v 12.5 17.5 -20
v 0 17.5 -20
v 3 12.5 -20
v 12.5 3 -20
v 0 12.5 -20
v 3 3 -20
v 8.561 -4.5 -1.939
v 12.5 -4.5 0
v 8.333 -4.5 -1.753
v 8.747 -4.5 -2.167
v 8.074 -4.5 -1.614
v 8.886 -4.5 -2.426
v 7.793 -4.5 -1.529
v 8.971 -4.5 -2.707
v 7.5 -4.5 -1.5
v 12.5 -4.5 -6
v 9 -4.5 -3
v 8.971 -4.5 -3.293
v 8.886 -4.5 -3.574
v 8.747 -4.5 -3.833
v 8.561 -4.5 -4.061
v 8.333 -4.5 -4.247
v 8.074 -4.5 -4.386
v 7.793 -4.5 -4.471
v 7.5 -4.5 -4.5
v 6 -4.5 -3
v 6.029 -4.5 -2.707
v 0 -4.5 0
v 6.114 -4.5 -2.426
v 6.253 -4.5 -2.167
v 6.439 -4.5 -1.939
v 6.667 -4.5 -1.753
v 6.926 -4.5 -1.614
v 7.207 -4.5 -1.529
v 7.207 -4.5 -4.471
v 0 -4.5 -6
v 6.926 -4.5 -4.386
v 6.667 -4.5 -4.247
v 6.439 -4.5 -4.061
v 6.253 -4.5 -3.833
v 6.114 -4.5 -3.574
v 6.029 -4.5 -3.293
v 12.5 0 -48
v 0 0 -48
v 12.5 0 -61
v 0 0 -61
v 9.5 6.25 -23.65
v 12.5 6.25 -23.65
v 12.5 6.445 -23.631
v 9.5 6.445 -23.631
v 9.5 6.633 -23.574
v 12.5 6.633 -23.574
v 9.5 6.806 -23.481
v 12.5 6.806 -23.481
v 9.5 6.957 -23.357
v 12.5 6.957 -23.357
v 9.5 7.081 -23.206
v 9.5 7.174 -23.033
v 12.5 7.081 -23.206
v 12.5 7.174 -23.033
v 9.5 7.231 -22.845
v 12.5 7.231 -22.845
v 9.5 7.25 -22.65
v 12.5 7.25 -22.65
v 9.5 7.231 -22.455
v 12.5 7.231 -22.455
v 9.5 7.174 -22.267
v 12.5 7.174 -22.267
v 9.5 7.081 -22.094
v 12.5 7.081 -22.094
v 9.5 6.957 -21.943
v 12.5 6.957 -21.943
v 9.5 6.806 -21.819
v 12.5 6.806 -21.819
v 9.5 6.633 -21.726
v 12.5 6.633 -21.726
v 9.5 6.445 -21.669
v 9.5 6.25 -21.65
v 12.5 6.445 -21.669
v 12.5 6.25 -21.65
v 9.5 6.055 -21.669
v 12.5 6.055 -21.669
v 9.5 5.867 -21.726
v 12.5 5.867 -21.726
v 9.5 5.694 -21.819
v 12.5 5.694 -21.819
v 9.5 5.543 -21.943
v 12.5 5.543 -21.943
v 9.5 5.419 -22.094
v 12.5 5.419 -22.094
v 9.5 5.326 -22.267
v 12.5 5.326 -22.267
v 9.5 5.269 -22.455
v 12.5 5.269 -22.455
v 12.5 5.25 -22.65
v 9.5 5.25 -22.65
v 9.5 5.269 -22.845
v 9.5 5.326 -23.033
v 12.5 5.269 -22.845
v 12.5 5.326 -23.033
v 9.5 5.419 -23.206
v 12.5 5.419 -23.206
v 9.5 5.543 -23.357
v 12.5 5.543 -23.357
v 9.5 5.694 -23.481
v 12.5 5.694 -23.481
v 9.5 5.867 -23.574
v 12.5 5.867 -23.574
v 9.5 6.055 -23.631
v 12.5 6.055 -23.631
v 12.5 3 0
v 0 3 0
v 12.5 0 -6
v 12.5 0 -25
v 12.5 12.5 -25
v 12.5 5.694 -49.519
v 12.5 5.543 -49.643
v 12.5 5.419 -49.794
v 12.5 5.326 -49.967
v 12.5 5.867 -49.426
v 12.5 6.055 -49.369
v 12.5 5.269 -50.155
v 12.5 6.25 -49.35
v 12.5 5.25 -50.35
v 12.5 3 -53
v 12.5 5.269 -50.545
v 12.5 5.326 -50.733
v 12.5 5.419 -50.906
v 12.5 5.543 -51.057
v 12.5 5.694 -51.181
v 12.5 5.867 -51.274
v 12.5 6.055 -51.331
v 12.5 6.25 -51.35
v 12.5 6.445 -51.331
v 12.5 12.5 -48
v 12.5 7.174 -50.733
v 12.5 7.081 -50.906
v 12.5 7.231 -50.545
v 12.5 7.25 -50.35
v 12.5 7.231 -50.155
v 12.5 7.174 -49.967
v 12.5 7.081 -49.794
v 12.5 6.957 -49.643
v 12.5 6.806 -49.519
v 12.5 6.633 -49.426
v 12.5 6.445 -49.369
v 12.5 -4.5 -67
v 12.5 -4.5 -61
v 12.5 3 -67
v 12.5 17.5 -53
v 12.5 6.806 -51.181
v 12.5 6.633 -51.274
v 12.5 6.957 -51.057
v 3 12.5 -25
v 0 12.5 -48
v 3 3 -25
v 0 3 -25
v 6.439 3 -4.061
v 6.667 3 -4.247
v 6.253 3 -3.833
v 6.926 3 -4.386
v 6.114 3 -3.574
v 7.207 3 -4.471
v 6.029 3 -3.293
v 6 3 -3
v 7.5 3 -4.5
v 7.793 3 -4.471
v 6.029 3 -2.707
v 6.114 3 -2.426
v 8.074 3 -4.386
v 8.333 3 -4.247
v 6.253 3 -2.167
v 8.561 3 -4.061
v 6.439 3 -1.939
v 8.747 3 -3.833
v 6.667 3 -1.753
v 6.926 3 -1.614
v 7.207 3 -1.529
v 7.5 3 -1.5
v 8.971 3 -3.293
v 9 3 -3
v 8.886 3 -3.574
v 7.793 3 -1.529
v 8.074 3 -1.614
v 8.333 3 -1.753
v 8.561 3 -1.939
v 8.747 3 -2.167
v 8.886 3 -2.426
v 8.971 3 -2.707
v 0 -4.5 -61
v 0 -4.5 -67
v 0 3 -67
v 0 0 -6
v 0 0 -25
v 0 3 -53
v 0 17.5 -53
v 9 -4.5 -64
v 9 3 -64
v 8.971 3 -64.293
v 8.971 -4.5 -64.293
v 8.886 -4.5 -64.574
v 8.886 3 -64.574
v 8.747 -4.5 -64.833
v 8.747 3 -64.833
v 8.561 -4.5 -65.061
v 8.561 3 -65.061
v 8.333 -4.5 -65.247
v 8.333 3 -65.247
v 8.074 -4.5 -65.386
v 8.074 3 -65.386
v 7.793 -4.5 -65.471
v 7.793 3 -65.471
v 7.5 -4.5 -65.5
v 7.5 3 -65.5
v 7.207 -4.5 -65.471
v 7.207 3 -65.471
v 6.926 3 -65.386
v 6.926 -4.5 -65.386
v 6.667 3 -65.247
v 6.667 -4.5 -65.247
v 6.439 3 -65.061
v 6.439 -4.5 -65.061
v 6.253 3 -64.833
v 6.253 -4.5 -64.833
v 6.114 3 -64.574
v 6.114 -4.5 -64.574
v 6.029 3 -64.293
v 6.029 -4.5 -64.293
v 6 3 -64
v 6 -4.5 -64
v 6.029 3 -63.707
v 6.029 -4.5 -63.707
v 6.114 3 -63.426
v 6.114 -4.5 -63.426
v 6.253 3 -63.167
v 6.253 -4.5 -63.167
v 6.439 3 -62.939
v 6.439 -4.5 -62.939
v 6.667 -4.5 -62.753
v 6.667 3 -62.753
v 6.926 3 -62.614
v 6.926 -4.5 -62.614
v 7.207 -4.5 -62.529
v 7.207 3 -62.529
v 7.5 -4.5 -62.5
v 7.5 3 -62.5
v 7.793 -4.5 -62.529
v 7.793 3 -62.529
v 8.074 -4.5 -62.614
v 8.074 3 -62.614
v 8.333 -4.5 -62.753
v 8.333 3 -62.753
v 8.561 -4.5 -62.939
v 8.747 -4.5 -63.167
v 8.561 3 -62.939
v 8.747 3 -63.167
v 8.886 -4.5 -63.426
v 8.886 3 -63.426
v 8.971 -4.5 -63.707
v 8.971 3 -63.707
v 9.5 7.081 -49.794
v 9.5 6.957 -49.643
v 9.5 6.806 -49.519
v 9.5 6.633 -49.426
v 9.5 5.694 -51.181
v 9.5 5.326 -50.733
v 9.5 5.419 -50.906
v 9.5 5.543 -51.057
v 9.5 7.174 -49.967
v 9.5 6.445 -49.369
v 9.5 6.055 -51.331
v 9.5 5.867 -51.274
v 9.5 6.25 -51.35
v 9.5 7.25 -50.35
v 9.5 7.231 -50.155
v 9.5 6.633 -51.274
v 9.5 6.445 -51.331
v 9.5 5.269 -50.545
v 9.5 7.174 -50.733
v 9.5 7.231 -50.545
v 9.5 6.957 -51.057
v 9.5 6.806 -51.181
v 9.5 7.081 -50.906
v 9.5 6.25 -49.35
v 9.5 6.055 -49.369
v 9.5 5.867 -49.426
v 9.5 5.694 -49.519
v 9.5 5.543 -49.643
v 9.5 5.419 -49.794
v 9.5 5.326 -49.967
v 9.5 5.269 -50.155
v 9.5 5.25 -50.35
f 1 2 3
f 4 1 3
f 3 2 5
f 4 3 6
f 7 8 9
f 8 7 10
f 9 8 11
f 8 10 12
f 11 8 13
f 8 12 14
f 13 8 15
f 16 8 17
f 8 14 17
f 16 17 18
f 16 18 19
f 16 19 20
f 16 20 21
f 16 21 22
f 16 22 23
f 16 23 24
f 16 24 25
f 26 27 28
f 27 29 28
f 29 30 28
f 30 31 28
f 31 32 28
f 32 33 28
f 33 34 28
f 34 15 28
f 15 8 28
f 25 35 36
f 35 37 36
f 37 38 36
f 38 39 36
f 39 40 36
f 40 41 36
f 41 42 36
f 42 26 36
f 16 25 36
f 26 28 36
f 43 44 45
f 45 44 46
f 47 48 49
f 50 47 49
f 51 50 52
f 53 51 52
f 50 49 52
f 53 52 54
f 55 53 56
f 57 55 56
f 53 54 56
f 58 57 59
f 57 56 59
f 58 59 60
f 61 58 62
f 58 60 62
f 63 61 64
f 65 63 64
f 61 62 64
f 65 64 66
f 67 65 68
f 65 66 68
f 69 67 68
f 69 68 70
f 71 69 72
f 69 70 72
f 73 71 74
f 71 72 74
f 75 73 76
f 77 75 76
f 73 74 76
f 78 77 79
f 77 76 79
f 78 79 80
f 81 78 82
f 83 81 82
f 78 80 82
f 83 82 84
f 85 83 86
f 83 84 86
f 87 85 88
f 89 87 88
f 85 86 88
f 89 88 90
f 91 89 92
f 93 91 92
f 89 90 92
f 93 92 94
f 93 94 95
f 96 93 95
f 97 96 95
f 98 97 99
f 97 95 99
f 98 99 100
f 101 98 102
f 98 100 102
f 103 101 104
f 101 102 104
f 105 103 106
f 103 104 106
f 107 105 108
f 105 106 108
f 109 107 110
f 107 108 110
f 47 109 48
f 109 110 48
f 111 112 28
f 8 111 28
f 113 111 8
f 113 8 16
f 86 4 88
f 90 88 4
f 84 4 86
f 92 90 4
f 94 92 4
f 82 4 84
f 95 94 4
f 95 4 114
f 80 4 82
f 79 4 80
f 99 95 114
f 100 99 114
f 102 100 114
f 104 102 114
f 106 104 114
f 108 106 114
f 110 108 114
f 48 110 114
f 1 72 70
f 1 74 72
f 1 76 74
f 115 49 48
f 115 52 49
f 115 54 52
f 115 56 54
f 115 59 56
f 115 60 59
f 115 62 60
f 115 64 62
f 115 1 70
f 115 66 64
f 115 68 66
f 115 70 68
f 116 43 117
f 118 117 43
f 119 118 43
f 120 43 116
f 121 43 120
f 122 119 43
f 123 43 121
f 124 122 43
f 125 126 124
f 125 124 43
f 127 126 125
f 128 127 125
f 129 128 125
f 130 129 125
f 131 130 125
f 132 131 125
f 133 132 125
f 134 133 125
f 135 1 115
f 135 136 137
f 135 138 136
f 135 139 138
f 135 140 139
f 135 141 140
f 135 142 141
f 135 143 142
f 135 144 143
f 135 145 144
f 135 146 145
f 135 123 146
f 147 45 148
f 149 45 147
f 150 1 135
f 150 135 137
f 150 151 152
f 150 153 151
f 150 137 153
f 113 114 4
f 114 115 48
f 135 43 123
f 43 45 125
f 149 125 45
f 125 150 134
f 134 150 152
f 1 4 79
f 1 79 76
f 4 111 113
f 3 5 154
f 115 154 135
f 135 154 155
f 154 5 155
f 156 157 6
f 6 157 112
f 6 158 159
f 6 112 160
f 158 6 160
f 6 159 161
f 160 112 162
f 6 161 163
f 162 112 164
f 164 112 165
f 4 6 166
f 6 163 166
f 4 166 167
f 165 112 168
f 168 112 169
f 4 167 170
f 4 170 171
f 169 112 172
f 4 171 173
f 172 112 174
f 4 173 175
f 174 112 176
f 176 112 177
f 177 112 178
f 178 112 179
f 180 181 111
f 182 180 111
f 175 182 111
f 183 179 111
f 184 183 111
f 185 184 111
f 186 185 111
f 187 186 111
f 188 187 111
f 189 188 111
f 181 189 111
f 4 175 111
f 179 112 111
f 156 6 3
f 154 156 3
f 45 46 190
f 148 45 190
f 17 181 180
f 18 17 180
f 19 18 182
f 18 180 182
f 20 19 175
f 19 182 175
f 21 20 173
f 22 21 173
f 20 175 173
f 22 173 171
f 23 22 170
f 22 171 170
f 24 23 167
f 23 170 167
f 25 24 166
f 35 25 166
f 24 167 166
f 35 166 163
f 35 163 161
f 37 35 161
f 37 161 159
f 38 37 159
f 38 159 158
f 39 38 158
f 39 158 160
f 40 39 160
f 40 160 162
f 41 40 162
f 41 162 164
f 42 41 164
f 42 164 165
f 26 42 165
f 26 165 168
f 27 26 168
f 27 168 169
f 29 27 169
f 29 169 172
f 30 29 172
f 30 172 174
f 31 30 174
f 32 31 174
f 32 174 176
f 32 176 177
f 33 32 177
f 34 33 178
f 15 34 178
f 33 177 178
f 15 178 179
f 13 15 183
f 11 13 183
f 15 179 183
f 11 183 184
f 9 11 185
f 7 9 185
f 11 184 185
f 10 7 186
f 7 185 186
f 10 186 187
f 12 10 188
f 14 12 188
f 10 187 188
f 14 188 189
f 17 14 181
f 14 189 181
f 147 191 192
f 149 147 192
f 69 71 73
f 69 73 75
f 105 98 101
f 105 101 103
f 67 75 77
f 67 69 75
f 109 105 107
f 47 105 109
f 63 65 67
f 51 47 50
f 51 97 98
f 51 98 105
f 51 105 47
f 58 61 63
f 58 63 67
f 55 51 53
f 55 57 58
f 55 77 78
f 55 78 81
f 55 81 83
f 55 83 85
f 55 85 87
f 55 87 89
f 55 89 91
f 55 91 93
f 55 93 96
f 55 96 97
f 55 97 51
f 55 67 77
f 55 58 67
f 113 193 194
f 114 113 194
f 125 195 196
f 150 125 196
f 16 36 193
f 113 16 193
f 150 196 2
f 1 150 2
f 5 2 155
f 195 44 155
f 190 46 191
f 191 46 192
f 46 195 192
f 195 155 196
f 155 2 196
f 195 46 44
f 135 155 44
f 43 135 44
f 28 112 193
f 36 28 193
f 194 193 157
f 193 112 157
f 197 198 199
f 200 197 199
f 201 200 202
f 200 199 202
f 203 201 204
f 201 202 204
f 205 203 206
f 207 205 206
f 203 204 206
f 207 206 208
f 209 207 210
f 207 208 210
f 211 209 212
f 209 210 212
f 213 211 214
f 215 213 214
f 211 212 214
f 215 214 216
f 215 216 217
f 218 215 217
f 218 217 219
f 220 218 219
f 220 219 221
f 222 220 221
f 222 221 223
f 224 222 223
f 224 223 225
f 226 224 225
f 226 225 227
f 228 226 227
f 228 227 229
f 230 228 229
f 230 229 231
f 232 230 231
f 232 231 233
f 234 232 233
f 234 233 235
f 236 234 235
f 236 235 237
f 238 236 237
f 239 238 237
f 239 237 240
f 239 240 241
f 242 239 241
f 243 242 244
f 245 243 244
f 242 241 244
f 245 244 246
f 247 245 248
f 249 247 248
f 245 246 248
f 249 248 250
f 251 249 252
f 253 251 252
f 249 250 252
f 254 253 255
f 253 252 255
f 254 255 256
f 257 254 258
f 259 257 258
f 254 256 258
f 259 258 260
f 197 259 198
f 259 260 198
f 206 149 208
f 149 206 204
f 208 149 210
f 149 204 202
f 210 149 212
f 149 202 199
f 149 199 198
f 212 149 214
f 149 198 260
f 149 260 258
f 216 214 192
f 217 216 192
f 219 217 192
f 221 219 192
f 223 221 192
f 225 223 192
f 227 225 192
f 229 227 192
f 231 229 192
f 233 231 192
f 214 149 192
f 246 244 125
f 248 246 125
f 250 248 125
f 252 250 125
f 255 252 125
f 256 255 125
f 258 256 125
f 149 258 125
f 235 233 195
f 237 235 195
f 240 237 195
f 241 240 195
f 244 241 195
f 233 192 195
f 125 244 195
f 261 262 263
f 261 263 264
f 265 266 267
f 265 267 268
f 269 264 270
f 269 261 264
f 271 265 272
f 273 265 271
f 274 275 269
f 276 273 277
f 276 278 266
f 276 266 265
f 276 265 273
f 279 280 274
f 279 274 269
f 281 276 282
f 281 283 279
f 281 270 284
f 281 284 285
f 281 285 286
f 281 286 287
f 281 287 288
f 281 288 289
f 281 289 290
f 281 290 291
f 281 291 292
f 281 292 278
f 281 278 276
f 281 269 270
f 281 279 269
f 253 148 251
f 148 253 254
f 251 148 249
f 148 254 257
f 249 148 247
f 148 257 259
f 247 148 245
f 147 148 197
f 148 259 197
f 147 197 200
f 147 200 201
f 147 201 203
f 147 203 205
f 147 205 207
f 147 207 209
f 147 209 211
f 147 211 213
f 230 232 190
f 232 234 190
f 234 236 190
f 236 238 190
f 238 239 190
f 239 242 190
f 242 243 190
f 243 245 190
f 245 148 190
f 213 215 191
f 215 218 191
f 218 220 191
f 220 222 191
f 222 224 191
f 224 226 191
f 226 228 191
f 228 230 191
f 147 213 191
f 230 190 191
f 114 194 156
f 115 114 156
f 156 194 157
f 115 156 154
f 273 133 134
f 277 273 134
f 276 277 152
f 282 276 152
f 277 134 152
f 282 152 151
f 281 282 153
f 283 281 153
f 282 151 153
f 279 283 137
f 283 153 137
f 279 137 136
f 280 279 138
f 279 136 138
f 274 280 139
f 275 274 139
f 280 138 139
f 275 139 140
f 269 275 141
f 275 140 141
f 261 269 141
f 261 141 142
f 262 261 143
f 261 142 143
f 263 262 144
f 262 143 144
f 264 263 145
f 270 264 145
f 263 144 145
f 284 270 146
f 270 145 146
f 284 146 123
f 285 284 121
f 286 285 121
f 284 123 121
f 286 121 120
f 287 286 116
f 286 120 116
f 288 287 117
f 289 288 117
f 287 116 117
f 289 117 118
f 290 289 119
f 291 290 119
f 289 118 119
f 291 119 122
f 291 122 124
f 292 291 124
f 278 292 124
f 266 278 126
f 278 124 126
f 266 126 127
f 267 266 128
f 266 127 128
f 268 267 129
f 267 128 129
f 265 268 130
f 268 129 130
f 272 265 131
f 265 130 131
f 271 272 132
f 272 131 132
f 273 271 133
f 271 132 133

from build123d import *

# Parameters (mm, degrees)
BOSS_EXTRUDE1_DEPTH = 12.5
SKETCH3_R           = 1.5
CUT_EXTRUDE1_DEPTH  = 12.5
SKETCH4_W           = 3
SKETCH4_H           = 9.5
CUT_EXTRUDE2_DEPTH  = 5
SKETCH5_R           = 1
CUT_EXTRUDE3_DEPTH  = 3


with BuildPart() as part:
    # Sketch2 → Boss-Extrude1 (new body)
    with BuildSketch(Plane(origin=(0, 0, 0), x_dir=(0, 0, -1), z_dir=(1, 0, 0))):
        Polygon((6, 0), (25, 0), (25, 12.5), (48, 12.5), (48, 0), (61, 0), (61, -4.5), (67, -4.5), (67, 0), (67, 3), (53, 3), (53, 17.5), (20, 17.5), (20, 3), (0, 3), (0, 0), (0, -4.5), (6, -4.5), align=None)
    extrude(amount=BOSS_EXTRUDE1_DEPTH)

    # Sketch3 → Cut-Extrude1 (cut)
    with BuildSketch(Plane(origin=(0, 3, 0), x_dir=(1, 0, 0), z_dir=(0, 1, 0))):
        with Locations((7.5, 3)):
            Circle(SKETCH3_R)
        with Locations((7.5, 64)):
            Circle(SKETCH3_R)
    extrude(amount=-CUT_EXTRUDE1_DEPTH, mode=Mode.SUBTRACT)

    # Sketch4 → Cut-Extrude2 (cut)
    with BuildSketch(Plane.XY.offset(-20)):
        with Locations((1.5, 7.75)):
            Rectangle(SKETCH4_W, SKETCH4_H)
    extrude(amount=-CUT_EXTRUDE2_DEPTH, mode=Mode.SUBTRACT)

    # Sketch5 → Cut-Extrude3 (cut)
    with BuildSketch(Plane(origin=(12.5, 0, 0), x_dir=(0, 0, -1), z_dir=(1, 0, 0))):
        with Locations((22.65, 6.25)):
            Circle(SKETCH5_R)
        with Locations((50.35, 6.25)):
            Circle(SKETCH5_R)
    extrude(amount=-CUT_EXTRUDE3_DEPTH, mode=Mode.SUBTRACT)


solid = part.part
